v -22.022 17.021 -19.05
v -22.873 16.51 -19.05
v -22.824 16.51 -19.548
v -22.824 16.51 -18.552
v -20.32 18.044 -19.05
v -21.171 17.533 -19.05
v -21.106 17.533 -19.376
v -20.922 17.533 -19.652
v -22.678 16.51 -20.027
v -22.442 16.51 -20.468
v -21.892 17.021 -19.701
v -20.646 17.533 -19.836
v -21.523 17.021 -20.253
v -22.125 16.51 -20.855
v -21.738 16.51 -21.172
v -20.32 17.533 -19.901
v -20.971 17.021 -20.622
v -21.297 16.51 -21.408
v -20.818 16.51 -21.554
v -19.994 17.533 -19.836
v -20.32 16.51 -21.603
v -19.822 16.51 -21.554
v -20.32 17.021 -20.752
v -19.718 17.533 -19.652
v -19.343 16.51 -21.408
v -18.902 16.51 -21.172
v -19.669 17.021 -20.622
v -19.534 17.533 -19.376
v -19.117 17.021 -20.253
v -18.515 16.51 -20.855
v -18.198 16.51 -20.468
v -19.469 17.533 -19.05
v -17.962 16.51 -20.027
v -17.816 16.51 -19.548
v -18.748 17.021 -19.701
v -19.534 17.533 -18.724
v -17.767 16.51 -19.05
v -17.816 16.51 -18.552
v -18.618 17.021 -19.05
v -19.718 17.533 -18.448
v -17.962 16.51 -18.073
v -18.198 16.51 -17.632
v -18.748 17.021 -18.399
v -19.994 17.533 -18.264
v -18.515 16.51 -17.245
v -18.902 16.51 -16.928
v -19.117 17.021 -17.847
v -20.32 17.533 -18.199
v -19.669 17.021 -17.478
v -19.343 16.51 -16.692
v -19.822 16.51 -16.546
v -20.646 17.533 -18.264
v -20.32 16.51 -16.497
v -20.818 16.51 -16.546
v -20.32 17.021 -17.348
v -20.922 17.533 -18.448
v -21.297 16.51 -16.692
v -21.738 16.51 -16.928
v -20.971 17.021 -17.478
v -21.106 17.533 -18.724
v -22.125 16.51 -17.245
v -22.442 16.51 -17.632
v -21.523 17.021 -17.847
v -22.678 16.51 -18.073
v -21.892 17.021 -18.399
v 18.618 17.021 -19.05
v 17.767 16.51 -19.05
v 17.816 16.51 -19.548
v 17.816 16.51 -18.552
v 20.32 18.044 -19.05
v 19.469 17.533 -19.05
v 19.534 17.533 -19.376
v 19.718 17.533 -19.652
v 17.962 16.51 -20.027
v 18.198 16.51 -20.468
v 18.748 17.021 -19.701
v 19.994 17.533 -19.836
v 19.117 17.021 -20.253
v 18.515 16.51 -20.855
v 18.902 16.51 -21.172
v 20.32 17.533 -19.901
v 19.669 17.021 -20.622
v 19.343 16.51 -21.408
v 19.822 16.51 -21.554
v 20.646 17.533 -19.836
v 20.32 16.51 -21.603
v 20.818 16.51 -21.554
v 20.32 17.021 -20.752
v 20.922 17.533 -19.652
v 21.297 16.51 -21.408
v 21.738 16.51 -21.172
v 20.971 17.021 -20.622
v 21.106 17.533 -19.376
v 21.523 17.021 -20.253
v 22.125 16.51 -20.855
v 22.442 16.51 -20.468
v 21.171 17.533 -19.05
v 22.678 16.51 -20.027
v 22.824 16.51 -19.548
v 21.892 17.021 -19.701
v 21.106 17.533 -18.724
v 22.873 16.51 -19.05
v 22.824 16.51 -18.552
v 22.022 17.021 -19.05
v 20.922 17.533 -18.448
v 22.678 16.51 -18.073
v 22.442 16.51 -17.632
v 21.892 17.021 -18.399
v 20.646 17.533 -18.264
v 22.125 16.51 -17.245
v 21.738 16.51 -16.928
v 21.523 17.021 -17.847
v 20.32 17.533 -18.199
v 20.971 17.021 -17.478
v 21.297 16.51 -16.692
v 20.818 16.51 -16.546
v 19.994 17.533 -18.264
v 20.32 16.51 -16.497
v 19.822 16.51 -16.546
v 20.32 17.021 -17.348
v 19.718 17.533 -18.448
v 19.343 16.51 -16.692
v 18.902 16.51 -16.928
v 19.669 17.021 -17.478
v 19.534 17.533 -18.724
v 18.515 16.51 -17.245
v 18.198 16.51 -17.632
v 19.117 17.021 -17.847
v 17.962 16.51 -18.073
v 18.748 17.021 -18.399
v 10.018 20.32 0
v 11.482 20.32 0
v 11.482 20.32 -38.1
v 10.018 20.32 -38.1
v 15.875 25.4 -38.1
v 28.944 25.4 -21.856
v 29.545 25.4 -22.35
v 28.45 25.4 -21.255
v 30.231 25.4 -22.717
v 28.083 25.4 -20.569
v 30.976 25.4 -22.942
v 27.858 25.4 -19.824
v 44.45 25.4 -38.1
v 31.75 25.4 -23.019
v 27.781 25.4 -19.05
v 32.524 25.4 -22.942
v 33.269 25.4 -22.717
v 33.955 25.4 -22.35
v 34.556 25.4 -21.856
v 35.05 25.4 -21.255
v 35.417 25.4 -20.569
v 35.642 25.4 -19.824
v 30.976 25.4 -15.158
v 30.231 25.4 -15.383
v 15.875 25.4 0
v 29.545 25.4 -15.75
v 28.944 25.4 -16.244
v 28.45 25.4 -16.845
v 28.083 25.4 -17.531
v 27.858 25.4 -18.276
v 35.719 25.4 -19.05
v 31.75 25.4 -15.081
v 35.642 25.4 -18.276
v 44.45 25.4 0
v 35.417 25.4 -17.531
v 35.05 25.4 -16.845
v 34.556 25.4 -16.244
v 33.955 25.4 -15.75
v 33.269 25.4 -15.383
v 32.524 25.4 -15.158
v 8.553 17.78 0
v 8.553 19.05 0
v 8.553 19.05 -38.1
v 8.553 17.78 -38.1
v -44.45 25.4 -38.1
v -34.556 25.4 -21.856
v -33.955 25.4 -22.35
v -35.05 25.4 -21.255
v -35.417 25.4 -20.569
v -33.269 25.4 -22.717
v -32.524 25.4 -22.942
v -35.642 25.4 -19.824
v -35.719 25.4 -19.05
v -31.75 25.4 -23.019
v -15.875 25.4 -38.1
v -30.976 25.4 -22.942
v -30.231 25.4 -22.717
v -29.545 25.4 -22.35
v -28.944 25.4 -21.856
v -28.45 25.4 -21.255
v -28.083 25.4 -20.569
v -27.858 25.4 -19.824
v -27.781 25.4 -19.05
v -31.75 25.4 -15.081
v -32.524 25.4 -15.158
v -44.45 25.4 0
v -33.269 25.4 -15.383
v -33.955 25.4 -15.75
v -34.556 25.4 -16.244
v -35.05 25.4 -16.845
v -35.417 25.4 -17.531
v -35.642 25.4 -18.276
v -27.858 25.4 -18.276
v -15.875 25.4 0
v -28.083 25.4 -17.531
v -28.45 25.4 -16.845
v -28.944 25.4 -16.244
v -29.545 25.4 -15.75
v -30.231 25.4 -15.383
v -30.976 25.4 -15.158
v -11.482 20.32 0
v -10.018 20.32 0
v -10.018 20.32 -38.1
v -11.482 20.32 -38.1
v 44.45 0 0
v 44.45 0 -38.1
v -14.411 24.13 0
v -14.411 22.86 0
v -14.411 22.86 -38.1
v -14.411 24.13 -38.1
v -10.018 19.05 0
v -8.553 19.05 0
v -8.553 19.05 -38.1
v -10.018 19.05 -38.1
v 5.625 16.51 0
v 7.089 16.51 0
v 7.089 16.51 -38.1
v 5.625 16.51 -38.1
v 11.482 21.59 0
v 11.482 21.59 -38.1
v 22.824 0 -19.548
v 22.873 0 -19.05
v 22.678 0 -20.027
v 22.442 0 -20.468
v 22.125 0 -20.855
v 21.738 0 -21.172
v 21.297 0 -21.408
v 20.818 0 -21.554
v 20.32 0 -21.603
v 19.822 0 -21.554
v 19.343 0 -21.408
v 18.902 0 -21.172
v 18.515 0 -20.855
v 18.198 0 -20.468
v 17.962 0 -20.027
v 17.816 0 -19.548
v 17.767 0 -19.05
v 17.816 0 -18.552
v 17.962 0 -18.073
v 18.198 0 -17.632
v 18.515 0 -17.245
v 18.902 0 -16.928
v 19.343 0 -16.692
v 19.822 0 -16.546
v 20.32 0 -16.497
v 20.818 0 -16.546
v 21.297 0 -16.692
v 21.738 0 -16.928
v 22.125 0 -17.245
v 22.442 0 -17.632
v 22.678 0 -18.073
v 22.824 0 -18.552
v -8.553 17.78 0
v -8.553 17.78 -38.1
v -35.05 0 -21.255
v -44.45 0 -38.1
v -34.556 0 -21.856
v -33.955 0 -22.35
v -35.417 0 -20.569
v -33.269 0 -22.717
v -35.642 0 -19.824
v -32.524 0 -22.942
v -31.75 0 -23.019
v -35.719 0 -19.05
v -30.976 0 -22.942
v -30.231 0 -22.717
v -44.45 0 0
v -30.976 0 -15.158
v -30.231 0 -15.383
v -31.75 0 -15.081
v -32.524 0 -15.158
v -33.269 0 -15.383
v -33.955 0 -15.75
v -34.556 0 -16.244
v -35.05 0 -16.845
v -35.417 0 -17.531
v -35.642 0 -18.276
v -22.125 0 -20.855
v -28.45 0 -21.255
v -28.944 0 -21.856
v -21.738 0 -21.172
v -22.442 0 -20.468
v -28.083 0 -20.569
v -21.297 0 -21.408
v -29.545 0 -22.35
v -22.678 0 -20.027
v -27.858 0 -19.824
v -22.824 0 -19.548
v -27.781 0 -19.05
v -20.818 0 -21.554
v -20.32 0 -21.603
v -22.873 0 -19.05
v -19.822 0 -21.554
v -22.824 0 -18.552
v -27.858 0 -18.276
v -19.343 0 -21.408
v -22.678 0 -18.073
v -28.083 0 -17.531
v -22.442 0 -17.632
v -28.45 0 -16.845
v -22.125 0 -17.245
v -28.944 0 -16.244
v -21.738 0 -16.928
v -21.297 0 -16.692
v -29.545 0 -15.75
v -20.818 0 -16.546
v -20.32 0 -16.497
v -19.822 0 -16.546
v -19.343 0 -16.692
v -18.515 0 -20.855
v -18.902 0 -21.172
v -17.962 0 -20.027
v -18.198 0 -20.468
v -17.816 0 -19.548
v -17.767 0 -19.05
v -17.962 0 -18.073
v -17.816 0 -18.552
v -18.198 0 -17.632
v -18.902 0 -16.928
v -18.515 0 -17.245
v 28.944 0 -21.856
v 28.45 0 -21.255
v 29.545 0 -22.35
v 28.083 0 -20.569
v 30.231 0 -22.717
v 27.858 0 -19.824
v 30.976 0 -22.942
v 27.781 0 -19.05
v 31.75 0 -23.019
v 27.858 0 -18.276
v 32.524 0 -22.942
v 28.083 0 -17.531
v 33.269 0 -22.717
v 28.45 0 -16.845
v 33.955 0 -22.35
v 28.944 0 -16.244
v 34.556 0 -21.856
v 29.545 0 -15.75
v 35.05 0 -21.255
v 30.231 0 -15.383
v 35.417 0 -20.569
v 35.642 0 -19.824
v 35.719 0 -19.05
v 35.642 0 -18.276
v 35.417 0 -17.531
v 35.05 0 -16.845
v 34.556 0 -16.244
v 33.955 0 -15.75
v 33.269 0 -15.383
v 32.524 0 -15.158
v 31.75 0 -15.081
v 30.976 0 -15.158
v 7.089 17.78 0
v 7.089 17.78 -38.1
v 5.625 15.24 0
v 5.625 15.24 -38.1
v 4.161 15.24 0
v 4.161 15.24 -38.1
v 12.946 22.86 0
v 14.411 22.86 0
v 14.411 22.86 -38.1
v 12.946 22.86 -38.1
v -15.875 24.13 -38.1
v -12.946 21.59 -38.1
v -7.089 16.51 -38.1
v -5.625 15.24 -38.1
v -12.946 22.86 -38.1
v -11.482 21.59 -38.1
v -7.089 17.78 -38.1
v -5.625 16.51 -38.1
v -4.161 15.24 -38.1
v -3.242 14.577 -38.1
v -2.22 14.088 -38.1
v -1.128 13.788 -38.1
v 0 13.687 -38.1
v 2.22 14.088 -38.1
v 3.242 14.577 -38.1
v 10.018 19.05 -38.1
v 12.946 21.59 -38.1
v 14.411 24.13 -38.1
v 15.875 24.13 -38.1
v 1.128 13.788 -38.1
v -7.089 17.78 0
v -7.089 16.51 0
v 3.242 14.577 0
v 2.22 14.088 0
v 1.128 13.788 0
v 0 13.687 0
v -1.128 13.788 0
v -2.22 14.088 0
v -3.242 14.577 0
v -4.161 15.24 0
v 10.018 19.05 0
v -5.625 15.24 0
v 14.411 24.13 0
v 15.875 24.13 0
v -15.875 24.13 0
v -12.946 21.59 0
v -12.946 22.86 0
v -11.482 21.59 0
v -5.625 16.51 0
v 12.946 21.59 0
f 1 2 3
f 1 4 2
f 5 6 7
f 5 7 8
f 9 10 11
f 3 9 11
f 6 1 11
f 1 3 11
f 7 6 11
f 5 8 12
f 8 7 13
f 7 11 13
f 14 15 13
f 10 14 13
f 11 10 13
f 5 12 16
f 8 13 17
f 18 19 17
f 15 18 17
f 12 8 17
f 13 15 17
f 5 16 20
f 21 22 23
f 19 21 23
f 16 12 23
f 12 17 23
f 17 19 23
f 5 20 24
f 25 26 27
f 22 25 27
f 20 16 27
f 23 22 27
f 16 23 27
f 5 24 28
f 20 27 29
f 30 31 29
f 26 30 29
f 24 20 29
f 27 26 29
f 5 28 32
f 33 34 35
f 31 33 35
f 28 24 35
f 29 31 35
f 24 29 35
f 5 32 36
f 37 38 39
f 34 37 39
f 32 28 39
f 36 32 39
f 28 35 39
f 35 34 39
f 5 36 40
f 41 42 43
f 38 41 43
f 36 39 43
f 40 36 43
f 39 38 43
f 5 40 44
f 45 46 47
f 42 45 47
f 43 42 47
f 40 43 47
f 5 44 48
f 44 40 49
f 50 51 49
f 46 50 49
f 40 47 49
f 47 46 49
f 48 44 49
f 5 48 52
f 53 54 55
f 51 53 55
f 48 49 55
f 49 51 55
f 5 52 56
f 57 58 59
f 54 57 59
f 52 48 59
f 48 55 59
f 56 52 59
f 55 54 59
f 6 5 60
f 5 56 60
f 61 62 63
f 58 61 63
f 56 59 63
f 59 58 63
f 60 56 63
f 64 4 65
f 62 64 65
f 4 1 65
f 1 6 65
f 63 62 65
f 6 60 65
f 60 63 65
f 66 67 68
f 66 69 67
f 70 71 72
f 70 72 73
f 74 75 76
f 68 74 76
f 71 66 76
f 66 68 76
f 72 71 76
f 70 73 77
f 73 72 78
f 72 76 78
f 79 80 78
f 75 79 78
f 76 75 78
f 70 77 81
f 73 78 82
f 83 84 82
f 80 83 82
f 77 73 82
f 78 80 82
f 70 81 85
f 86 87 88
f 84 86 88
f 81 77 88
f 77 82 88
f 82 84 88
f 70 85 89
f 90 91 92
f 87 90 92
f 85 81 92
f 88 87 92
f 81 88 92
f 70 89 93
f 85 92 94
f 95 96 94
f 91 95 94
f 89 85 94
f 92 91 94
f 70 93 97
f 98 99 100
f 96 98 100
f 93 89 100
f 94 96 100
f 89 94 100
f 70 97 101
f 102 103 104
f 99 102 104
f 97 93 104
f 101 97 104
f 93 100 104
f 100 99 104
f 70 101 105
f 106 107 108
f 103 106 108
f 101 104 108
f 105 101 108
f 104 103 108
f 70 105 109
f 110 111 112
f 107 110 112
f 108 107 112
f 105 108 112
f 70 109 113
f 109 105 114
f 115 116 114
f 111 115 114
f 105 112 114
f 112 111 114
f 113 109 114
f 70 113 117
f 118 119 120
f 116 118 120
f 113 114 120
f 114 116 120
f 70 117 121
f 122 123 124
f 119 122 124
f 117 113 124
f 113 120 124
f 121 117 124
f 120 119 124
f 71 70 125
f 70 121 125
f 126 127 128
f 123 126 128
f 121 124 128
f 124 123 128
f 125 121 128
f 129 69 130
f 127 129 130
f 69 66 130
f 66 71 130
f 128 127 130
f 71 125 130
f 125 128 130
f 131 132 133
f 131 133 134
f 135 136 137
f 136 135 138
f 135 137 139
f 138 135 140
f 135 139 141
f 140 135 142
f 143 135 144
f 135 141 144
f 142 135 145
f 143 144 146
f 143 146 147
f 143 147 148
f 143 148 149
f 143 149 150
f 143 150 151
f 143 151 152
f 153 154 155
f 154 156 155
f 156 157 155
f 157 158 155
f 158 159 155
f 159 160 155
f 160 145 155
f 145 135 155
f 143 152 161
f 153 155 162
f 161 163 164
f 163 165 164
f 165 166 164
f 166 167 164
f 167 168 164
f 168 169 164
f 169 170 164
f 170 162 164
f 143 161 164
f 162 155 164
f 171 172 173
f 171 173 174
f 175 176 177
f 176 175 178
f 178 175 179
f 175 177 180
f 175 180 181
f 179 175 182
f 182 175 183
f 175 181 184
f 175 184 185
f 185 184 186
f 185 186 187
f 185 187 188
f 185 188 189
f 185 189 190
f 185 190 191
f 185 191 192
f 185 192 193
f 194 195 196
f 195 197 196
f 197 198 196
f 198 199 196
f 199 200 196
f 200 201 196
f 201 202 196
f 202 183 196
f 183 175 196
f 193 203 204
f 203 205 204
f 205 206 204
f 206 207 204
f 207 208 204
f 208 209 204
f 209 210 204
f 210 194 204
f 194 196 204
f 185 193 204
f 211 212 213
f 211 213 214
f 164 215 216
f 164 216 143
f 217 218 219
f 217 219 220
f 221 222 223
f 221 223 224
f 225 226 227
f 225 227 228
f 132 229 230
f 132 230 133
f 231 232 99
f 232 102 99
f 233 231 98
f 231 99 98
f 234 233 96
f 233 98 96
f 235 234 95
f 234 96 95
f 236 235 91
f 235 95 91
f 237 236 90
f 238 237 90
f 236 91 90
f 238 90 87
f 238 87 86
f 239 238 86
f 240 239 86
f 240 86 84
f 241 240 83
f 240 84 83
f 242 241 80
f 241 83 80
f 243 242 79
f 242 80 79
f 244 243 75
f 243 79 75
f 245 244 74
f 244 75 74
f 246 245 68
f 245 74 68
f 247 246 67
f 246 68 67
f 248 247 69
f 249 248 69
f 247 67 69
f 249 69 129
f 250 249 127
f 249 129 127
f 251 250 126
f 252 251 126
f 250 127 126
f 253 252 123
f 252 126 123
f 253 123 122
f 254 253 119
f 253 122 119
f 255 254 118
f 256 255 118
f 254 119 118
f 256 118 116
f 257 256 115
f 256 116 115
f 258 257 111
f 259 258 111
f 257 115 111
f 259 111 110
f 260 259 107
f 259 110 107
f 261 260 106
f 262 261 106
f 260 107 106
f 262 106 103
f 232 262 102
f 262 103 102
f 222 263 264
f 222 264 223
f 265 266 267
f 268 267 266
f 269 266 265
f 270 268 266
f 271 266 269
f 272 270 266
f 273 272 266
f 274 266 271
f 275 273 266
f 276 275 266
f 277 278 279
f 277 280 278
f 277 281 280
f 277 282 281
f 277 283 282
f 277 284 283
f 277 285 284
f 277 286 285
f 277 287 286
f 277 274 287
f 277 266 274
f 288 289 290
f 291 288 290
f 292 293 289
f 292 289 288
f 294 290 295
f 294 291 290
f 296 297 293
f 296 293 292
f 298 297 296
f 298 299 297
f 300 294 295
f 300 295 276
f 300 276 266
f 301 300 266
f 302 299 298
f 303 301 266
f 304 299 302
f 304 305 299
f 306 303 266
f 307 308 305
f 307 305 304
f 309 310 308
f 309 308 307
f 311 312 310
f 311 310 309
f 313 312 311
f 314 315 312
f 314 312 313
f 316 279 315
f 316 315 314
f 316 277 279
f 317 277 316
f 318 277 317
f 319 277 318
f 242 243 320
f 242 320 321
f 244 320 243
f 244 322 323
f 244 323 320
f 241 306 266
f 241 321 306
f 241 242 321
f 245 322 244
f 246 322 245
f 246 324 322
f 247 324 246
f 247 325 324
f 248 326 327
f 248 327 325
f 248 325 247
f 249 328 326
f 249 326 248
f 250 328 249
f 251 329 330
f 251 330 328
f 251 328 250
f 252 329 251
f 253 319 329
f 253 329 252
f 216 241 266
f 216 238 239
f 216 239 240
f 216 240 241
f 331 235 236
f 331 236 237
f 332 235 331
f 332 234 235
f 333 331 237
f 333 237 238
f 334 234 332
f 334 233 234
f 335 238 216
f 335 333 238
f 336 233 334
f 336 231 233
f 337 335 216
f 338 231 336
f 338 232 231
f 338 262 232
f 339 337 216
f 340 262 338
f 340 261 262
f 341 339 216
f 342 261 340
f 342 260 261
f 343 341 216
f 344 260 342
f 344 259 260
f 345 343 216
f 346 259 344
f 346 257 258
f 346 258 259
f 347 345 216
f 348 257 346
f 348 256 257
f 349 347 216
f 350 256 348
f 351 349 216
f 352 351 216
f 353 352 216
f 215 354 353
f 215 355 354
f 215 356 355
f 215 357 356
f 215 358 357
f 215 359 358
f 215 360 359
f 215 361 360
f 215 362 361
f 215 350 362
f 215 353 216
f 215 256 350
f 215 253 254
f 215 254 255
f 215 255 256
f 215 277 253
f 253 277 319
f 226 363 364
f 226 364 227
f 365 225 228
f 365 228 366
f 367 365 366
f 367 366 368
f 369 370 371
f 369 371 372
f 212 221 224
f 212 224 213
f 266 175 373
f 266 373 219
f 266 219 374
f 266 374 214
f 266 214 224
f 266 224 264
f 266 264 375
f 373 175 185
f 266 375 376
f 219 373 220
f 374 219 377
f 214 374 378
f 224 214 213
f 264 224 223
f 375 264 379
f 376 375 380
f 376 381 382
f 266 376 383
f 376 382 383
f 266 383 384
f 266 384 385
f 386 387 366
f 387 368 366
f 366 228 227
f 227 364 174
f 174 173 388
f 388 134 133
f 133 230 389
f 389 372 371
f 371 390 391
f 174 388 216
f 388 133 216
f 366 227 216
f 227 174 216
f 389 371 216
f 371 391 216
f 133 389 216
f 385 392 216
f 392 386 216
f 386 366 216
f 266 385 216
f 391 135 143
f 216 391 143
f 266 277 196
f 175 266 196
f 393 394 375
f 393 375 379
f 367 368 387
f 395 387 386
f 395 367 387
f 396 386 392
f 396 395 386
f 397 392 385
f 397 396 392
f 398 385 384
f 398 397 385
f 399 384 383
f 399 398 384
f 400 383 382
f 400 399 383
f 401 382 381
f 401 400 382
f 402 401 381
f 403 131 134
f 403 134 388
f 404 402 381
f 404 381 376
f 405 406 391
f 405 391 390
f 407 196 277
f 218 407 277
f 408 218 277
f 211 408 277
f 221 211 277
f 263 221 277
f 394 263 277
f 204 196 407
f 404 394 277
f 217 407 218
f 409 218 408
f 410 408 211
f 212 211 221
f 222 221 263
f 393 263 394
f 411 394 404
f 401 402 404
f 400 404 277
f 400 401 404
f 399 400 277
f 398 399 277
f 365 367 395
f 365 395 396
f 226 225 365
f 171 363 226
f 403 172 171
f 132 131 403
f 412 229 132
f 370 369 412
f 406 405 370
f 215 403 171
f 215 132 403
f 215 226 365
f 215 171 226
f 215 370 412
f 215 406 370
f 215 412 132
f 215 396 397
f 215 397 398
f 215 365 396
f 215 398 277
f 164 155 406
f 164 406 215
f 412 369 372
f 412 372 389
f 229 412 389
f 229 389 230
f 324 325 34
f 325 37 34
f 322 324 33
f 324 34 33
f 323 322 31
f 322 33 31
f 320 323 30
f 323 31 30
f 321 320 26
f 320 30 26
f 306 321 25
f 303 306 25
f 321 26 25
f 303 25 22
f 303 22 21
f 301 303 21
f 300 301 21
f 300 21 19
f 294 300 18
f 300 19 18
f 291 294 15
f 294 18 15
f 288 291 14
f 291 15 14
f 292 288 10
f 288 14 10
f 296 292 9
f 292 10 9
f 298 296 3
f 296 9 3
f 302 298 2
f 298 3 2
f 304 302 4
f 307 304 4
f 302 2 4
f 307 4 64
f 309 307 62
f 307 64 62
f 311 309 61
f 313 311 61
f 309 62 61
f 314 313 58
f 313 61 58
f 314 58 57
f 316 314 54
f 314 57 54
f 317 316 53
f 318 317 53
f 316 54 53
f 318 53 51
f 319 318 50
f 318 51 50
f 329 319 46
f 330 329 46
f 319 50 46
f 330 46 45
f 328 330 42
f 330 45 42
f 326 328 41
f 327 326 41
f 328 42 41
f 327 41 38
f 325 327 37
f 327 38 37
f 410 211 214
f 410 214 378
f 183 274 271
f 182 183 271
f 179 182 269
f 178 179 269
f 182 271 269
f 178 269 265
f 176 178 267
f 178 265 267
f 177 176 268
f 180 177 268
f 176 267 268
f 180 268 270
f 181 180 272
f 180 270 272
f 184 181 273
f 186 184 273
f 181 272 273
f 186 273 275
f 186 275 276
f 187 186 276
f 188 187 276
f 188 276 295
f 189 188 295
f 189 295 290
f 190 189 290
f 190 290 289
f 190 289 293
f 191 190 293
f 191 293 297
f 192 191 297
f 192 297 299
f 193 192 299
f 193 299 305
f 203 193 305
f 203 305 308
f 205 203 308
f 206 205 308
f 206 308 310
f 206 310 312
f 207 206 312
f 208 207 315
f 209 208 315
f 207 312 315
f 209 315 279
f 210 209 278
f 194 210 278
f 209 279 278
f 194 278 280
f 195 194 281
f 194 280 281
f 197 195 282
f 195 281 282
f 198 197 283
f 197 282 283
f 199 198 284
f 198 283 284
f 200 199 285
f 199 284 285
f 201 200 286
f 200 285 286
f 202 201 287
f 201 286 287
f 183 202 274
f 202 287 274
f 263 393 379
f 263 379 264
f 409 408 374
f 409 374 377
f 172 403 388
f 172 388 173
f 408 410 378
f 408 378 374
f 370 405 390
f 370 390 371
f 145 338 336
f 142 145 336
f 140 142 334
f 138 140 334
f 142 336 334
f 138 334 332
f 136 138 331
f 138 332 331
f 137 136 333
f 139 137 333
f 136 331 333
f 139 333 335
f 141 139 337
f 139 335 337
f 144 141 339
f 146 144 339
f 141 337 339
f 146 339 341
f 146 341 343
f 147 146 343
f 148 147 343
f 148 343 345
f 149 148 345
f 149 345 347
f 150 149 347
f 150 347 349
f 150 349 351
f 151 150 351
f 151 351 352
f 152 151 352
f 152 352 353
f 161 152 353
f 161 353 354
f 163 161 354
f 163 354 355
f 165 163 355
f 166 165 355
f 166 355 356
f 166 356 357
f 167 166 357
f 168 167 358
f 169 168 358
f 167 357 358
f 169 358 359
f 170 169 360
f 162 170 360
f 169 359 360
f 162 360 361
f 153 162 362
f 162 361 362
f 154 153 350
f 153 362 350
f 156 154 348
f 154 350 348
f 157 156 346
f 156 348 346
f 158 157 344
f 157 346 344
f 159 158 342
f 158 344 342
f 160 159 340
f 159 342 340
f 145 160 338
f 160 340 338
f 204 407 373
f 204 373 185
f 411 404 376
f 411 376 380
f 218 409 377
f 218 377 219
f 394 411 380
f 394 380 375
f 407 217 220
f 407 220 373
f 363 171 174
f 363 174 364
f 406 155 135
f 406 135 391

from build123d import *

# Parameters (mm, degrees)
SKETCH1_W                   = 88.9
SKETCH1_H                   = 25.4
BOSS_EXTRUDE1_DEPTH         = 38.1
CUT_EXTRUDE1_REACH          = 40.1
F_3_8_16_TAPPED_HOLE1_D     = 7.9375
F_1_4_20_TAPPED_HOLE1_D     = 5.1054
F_1_4_20_TAPPED_HOLE1_DEPTH = 16.51
F_1_4_20_TAPPED_HOLE1_TIP   = 1.533816902


with BuildPart() as part:
    # Sketch1 → Boss-Extrude1 (new body)
    with BuildSketch(Plane.XY):
        with Locations((0, 12.7)):
            Rectangle(SKETCH1_W, SKETCH1_H)
    extrude(amount=-BOSS_EXTRUDE1_DEPTH)

    # Sketch2 → Cut-Extrude1 (cut, up to next)
    with BuildSketch(Plane.XY, mode=Mode.PRIVATE) as cut_extrude1_sk1:
        with BuildLine():
            Line((-15.875, 25.4), (0, 25.4))
            Line((0, 25.4), (15.875, 25.4))
            Line((15.875, 25.4), (15.875, 24.13))
            Line((15.875, 24.13), (14.410694861, 24.13))
            Line((14.410694861, 24.13), (14.410694861, 22.86))
            Line((14.410694861, 22.86), (12.946389723, 22.86))
            Line((12.946389723, 22.86), (12.946389723, 21.59))
            Line((12.946389723, 21.59), (11.482084584, 21.59))
            Line((11.482084584, 21.59), (11.482084584, 20.32))
            Line((11.482084584, 20.32), (10.017779445, 20.32))
            Line((10.017779445, 20.32), (10.017779445, 19.05))
            Line((10.017779445, 19.05), (8.553474306, 19.05))
            Line((8.553474306, 19.05), (8.553474306, 17.78))
            Line((8.553474306, 17.78), (7.089169168, 17.78))
            Line((7.089169168, 17.78), (7.089169168, 16.51))
            Line((7.089169168, 16.51), (5.624864029, 16.51))
            Line((5.624864029, 16.51), (5.624864029, 15.24))
            Line((5.624864029, 15.24), (4.16055889, 15.24))
            ThreePointArc((4.16055889, 15.24), (0, 13.687108475), (-4.16055889, 15.24))
            Line((-4.16055889, 15.24), (-5.624864029, 15.24))
            Line((-5.624864029, 15.24), (-5.624864029, 16.51))
            Line((-5.624864029, 16.51), (-7.089169168, 16.51))
            Line((-7.089169168, 16.51), (-7.089169168, 17.78))
            Line((-7.089169168, 17.78), (-8.553474306, 17.78))
            Line((-8.553474306, 17.78), (-8.553474306, 19.05))
            Line((-8.553474306, 19.05), (-10.017779445, 19.05))
            Line((-10.017779445, 19.05), (-10.017779445, 20.32))
            Line((-10.017779445, 20.32), (-11.482084584, 20.32))
            Line((-11.482084584, 20.32), (-11.482084584, 21.59))
            Line((-11.482084584, 21.59), (-12.946389723, 21.59))
            Line((-12.946389723, 21.59), (-12.946389723, 22.86))
            Line((-12.946389723, 22.86), (-14.410694861, 22.86))
            Line((-14.410694861, 22.86), (-14.410694861, 24.13))
            Line((-14.410694861, 24.13), (-15.875, 24.13))
            Line((-15.875, 24.13), (-15.875, 25.4))
        make_face()
    cut_extrude1_tool1 = extrude(cut_extrude1_sk1.sketch, amount=-CUT_EXTRUDE1_REACH, mode=Mode.PRIVATE) & part.part
    add(cut_extrude1_tool1.solids().sort_by_distance((0, 20.970592, 0))[0], mode=Mode.SUBTRACT)

    # 3/8-16 Tapped Hole1 (through all)
    with Locations(Plane(origin=(0, 25.4, 0), x_dir=(1, 0, 0), z_dir=(0, 1, 0))):
        with Locations((-31.75, 19.05), (31.75, 19.05)):
            Hole(F_3_8_16_TAPPED_HOLE1_D / 2)

    # 1/4-20 Tapped Hole1
    with Locations(Plane(origin=(0, 0, 0), x_dir=(-1, 0, 0), z_dir=(0, -1, 0))):
        with Locations((-20.32, 19.05), (20.32, 19.05)):
            Hole(F_1_4_20_TAPPED_HOLE1_D / 2, depth=F_1_4_20_TAPPED_HOLE1_DEPTH)
            with Locations((0, 0, -(F_1_4_20_TAPPED_HOLE1_DEPTH + F_1_4_20_TAPPED_HOLE1_TIP / 2))):  # 118° drill point
                Cone(0, F_1_4_20_TAPPED_HOLE1_D / 2, F_1_4_20_TAPPED_HOLE1_TIP, mode=Mode.SUBTRACT)


solid = part.part
